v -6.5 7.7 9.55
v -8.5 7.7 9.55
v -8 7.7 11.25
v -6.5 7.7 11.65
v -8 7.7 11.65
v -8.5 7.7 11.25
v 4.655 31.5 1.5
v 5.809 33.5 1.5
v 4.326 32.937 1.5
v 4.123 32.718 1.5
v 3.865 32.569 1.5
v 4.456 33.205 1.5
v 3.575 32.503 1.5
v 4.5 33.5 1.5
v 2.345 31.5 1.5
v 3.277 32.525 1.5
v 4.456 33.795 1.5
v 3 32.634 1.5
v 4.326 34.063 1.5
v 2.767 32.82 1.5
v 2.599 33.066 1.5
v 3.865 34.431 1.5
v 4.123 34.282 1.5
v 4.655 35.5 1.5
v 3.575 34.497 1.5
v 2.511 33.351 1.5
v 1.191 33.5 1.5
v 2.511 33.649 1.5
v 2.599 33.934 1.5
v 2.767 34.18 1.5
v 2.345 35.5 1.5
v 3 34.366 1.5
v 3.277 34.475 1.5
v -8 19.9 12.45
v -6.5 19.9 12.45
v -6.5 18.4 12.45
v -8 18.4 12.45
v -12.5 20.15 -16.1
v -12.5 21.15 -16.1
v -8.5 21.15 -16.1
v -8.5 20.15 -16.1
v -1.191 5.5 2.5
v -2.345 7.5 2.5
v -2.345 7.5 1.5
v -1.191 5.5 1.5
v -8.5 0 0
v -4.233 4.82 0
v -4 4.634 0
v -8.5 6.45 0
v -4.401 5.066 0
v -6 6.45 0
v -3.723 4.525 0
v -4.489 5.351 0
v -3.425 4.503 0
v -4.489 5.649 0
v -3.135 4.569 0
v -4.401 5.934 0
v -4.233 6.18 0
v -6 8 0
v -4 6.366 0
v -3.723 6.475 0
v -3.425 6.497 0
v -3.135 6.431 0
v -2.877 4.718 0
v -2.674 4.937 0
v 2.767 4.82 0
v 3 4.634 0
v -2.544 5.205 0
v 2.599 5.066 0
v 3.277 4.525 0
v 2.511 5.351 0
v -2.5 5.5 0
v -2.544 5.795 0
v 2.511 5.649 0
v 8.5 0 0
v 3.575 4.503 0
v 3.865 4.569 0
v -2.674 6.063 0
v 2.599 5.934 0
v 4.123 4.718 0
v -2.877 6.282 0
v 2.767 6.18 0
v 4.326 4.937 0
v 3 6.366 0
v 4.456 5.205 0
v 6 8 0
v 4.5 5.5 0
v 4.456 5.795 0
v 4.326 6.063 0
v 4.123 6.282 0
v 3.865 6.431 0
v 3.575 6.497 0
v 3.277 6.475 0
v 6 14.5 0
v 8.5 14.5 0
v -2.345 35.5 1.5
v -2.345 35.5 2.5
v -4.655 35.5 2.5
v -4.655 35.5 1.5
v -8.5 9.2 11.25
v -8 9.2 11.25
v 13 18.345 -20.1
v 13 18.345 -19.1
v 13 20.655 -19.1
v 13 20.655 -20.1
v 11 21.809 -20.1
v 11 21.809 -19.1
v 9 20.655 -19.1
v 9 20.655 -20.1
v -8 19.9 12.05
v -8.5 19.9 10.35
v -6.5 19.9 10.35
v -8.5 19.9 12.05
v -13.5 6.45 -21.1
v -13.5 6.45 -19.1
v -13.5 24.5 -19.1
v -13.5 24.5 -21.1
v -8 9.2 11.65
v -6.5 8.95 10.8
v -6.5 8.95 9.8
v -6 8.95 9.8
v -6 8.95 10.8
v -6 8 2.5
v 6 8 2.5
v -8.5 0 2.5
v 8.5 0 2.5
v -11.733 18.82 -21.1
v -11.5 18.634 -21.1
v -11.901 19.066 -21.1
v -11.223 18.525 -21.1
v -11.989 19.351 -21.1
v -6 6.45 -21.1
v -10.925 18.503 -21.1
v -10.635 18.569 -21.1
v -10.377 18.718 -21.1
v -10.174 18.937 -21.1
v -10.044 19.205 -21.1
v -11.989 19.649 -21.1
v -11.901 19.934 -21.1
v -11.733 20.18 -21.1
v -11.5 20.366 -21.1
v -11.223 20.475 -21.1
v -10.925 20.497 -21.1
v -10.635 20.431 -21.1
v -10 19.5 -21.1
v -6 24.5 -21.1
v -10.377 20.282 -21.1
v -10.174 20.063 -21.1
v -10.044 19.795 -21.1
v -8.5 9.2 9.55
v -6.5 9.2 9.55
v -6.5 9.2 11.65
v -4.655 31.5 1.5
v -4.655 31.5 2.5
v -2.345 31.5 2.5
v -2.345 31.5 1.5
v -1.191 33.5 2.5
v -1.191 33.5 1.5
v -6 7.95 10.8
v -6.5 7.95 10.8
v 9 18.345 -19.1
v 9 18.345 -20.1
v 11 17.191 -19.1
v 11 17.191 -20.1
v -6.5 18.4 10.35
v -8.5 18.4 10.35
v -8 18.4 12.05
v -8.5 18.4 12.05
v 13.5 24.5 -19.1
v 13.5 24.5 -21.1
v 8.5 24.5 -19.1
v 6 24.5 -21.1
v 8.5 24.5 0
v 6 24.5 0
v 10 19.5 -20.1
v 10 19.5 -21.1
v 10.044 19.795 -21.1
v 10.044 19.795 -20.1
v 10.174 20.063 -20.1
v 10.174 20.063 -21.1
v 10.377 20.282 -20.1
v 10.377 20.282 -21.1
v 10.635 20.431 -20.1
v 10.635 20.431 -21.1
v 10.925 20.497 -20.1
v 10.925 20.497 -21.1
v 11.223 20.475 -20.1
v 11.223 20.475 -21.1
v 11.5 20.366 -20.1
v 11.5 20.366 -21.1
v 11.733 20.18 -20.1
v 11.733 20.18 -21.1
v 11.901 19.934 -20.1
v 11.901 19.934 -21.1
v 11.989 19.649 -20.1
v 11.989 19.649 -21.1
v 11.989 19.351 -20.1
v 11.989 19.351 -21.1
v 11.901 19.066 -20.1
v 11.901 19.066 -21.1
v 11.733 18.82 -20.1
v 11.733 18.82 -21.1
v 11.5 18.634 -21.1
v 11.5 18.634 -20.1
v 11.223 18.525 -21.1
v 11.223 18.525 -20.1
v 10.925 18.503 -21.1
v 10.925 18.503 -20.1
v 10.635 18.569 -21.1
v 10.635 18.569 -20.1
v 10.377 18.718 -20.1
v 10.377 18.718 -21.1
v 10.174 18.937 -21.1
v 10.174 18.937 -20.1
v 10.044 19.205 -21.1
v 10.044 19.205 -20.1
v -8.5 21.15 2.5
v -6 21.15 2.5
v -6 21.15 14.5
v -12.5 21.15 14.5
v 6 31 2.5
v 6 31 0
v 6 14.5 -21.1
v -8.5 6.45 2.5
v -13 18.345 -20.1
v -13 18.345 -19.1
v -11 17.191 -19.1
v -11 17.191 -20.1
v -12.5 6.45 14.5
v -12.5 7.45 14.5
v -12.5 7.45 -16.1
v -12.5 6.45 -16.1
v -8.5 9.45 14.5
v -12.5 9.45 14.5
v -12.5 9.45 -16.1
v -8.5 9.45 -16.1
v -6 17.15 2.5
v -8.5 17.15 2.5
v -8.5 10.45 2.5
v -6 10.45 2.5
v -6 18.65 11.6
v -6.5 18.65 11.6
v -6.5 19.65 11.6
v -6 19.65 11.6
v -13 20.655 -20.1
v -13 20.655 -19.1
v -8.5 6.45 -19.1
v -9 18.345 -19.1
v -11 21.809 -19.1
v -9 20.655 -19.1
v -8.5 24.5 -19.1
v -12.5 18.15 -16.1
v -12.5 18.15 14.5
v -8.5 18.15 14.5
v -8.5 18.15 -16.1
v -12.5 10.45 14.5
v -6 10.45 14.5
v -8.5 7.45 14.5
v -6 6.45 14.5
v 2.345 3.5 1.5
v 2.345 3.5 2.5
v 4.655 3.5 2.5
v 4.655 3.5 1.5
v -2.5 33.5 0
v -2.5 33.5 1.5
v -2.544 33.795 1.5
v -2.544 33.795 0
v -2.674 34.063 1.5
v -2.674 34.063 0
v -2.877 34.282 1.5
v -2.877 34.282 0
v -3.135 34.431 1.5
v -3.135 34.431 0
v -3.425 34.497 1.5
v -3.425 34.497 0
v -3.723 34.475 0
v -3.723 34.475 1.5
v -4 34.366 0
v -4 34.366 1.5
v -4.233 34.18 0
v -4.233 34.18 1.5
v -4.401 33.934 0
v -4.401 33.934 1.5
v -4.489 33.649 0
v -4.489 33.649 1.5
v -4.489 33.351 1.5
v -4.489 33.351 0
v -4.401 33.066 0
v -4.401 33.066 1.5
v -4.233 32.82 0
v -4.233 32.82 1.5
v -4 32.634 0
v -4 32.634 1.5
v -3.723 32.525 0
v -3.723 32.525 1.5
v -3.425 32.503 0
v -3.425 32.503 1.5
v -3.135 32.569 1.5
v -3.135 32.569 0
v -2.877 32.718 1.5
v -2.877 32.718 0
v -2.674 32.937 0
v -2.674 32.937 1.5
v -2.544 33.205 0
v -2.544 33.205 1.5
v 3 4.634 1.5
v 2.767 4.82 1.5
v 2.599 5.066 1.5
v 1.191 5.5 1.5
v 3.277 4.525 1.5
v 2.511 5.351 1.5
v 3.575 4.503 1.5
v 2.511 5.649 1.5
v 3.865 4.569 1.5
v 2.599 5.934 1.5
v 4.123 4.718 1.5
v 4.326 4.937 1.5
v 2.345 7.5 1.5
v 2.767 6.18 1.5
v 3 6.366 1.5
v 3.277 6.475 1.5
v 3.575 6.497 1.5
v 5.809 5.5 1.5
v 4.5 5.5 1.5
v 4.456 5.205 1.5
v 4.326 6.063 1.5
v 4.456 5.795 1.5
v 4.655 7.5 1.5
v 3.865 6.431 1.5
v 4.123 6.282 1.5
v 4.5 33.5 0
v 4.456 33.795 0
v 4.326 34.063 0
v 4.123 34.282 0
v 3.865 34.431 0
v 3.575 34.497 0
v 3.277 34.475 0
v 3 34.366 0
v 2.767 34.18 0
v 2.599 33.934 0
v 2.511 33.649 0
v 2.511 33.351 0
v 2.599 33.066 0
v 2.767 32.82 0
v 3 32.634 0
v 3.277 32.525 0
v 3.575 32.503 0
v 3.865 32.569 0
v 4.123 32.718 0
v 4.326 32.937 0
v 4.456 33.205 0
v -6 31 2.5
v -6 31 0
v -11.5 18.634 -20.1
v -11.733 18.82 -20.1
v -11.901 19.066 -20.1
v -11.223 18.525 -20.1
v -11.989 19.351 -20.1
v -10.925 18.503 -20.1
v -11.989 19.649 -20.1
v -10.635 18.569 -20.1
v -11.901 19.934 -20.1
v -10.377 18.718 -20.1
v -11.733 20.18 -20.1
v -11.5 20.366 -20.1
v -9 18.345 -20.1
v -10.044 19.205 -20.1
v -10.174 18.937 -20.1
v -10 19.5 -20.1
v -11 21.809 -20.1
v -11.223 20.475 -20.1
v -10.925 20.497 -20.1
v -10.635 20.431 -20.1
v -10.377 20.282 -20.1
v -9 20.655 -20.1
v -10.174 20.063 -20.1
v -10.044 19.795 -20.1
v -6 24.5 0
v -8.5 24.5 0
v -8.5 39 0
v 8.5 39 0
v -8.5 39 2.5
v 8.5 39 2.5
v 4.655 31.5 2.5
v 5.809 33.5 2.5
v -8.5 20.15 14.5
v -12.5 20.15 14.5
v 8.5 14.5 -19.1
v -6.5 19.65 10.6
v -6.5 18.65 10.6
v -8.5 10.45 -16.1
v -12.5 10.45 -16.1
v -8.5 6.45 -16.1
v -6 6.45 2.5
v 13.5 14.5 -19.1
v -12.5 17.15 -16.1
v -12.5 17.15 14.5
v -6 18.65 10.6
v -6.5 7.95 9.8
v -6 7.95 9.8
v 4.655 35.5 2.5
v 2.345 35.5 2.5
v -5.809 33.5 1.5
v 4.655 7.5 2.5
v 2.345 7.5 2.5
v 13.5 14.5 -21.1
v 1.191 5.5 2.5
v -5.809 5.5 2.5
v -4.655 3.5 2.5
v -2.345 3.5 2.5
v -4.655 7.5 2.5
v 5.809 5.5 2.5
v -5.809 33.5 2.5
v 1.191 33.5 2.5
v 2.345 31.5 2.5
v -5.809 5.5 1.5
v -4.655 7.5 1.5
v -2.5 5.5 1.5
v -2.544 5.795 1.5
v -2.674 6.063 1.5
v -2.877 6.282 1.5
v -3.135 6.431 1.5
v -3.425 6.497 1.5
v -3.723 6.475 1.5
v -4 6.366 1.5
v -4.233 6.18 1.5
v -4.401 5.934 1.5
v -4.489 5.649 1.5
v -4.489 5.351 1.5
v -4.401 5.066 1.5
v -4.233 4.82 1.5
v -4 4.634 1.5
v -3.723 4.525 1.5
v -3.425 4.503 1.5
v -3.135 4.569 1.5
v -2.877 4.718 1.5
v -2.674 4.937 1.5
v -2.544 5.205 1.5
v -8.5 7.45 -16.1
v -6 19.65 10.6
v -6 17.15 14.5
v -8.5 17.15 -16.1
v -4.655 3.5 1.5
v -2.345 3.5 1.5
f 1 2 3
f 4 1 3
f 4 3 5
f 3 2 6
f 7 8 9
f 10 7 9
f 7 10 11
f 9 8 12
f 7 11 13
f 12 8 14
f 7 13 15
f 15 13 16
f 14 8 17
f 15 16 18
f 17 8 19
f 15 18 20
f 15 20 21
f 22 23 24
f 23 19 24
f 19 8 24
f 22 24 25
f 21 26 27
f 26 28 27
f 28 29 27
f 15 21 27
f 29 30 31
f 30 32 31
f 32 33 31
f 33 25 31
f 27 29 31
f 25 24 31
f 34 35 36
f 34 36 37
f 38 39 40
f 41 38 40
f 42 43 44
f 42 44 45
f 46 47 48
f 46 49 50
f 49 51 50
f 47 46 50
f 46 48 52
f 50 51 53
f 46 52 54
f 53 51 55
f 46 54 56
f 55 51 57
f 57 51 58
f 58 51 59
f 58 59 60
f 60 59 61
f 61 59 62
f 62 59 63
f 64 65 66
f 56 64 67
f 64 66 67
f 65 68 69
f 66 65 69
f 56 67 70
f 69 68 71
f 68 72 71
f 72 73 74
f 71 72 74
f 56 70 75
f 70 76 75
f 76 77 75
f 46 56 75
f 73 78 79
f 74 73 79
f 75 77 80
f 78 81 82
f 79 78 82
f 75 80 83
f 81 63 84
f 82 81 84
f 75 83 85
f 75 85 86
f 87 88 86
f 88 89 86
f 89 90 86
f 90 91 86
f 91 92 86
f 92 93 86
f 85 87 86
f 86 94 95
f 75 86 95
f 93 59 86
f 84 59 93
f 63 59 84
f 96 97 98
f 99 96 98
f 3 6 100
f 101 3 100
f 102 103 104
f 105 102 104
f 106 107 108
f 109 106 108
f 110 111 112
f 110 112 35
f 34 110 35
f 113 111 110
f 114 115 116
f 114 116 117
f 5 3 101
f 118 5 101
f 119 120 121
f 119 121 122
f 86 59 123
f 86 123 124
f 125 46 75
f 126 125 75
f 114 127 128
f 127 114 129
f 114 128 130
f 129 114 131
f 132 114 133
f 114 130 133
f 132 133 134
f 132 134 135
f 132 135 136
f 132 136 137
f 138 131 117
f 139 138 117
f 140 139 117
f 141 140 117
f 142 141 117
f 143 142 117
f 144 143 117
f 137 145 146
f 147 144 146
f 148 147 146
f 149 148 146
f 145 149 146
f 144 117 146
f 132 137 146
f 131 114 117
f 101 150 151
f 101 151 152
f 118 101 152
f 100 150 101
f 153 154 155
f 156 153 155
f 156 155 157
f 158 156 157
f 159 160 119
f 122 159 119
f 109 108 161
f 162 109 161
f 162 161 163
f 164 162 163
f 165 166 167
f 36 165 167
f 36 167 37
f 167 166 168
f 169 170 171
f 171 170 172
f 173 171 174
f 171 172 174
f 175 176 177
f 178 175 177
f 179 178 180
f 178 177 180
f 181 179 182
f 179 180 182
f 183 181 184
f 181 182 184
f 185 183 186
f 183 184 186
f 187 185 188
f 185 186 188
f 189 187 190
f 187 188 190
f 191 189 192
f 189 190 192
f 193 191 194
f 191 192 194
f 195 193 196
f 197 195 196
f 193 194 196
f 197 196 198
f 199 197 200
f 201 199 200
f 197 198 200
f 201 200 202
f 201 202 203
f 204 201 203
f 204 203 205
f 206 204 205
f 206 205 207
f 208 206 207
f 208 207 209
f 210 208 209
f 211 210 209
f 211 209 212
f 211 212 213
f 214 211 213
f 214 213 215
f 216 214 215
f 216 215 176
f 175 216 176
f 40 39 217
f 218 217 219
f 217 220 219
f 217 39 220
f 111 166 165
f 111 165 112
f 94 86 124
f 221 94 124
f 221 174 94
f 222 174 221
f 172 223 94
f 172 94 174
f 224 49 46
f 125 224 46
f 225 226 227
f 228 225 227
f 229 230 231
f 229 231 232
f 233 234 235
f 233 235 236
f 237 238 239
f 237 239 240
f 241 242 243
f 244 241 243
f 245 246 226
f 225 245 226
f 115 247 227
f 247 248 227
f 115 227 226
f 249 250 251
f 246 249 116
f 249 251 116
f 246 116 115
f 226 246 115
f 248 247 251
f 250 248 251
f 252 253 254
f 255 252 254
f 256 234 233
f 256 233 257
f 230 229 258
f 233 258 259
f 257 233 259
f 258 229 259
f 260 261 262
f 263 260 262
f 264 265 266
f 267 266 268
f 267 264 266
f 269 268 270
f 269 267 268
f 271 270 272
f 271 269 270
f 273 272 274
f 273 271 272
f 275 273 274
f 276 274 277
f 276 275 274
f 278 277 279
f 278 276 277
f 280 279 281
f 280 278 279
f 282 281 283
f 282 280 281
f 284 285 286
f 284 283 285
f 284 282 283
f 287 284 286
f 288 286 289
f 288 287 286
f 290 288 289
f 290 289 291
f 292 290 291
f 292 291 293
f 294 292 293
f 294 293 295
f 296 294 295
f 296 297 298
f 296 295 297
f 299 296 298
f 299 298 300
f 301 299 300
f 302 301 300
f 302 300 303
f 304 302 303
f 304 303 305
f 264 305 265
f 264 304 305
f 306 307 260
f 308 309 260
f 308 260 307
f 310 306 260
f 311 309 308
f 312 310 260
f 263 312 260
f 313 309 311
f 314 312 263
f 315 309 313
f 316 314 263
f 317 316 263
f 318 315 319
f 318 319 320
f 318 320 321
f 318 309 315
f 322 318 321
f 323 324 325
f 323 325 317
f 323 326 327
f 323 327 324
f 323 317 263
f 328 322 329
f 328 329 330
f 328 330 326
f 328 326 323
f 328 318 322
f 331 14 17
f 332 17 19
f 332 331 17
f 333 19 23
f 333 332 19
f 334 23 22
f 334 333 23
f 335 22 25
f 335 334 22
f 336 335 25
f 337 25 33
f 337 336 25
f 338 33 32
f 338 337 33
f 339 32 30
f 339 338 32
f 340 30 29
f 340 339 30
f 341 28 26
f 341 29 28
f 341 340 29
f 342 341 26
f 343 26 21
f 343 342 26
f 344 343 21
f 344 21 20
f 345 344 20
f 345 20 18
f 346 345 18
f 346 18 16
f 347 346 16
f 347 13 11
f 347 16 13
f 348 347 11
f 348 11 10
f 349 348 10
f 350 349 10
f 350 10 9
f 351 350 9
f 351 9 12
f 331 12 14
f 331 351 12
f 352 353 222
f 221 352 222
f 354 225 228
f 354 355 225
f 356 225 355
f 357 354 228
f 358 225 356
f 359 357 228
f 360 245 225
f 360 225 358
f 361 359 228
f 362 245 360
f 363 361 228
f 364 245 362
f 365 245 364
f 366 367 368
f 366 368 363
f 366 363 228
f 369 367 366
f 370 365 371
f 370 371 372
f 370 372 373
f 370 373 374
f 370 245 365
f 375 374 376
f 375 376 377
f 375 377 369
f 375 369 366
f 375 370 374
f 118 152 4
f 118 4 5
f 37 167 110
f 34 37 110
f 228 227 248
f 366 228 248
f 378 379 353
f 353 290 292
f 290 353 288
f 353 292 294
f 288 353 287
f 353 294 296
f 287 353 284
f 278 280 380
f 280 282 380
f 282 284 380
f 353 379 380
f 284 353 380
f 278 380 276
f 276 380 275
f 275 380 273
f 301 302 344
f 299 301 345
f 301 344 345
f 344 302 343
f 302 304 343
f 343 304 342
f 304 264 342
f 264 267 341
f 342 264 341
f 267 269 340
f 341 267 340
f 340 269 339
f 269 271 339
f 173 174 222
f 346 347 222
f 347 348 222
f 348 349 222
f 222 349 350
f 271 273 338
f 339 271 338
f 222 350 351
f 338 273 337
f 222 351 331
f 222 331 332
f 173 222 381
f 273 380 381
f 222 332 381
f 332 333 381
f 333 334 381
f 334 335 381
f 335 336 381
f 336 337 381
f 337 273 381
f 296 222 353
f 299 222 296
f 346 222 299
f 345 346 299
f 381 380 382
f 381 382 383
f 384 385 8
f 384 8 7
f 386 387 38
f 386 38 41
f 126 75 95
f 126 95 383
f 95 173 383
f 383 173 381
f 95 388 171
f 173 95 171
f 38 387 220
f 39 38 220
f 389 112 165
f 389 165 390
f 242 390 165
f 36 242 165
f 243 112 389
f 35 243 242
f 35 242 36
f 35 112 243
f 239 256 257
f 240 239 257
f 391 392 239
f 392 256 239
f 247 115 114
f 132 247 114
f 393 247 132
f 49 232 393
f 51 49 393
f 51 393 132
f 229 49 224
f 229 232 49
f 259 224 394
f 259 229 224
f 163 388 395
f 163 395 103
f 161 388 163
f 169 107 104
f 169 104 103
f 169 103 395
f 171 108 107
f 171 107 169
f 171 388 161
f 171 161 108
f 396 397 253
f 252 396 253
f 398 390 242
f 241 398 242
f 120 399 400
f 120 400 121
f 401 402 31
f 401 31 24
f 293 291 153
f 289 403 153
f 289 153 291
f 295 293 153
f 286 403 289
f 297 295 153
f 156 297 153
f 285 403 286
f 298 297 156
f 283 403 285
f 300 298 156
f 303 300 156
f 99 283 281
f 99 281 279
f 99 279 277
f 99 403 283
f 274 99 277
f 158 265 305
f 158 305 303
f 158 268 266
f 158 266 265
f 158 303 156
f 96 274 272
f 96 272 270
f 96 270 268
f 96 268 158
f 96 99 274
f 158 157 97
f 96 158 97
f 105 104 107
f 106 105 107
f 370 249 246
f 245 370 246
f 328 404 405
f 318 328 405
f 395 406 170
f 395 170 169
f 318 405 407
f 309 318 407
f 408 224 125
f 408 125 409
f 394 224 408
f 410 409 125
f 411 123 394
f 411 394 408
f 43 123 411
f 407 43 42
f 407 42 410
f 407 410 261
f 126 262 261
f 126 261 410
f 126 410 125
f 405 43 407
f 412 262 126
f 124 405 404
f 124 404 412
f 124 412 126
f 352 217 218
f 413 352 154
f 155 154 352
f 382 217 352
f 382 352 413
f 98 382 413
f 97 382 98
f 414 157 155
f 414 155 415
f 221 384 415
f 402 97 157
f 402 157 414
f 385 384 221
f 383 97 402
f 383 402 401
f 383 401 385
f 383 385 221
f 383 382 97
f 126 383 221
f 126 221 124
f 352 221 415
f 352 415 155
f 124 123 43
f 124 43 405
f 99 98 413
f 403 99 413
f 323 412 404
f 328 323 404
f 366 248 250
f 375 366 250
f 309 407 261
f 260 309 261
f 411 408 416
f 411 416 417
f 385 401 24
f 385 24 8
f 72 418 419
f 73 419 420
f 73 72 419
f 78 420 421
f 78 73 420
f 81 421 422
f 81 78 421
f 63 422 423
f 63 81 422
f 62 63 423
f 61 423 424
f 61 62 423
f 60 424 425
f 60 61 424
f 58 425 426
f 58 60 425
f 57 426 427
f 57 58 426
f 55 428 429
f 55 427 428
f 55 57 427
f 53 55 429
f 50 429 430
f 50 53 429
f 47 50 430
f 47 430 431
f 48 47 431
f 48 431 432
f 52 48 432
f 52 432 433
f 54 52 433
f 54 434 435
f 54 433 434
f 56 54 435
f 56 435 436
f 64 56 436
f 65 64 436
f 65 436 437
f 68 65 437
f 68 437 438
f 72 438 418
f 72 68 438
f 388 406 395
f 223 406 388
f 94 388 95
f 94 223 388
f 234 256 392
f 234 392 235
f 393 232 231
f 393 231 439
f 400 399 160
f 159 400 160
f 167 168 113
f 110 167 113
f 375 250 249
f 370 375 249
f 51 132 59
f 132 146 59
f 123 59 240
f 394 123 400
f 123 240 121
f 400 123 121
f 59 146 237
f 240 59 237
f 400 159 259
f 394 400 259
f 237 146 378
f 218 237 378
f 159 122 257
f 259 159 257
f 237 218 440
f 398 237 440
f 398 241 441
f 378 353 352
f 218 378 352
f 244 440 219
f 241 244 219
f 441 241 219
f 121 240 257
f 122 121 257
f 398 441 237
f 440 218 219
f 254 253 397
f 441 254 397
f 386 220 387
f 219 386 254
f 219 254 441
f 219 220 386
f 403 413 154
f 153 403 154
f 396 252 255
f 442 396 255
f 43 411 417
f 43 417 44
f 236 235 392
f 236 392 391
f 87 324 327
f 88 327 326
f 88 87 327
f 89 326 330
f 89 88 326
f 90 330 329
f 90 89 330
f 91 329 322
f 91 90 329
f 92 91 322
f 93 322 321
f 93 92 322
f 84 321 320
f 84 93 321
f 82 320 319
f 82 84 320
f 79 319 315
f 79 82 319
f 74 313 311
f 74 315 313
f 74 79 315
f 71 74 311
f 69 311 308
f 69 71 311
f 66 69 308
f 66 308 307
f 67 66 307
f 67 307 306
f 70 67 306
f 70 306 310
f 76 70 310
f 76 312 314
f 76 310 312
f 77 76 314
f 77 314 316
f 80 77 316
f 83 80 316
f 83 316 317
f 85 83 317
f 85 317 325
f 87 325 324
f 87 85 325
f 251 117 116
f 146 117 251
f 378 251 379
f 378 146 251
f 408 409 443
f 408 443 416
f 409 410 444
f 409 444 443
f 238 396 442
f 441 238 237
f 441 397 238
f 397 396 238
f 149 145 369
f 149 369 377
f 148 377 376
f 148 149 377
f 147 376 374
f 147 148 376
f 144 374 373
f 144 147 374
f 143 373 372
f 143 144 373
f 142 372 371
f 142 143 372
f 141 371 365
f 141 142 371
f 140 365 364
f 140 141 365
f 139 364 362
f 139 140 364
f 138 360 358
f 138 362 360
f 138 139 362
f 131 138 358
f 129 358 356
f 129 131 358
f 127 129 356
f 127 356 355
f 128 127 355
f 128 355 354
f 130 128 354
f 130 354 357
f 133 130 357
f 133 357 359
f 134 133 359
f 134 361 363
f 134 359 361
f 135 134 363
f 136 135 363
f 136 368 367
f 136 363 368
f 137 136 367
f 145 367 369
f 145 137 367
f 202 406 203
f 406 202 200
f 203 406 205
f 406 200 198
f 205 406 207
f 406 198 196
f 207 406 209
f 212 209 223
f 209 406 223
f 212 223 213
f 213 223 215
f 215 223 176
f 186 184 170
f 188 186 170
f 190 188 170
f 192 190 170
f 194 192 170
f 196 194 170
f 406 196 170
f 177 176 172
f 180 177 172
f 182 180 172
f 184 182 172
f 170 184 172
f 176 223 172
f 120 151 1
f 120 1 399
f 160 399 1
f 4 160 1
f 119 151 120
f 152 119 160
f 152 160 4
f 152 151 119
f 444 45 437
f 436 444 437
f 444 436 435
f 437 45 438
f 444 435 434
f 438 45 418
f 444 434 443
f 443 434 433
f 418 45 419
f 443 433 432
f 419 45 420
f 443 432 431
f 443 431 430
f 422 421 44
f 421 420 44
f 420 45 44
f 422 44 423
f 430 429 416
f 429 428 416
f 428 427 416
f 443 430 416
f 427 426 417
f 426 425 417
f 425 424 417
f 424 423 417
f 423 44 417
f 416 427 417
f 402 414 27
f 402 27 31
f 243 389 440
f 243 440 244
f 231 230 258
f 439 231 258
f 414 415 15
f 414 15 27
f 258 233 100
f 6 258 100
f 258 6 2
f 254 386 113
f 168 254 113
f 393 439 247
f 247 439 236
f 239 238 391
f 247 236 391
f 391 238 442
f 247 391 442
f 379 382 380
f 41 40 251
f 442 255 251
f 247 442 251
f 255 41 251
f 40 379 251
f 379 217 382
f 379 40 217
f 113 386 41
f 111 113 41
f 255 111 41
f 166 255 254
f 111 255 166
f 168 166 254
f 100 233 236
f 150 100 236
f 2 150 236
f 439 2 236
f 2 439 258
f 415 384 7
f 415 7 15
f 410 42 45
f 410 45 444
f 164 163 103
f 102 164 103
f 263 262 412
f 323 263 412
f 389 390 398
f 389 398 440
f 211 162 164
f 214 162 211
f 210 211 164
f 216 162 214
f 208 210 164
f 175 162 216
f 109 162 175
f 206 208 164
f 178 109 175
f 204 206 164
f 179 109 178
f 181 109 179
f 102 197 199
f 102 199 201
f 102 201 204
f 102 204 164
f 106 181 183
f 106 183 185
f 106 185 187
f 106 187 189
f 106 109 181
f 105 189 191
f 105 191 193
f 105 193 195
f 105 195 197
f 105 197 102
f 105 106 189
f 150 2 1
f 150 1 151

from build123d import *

# Parameters (mm, degrees)
SKETCH1_W                     = 17
SKETCH1_H                     = 39
SKETCH1_R                     = 1
SKETCH1_W_2                   = 12
SKETCH1_H_2                   = 23
SERVOBRACKET_DEPTH            = 2.5
SKETCH1_5_W                   = 2.5
SKETCH1_5_H                   = 10
SUPPORTLEGS_DEPTH             = 21.1
SKETCH2_W                     = 2
SKETCH2_H                     = 10
SUPPORTFOOT_DEPTH             = 5
BASEBOLTHOLE_START            = -3
SKETCH3_R                     = 1
BASEBOLTHOLE_DEPTH            = 25.6
SERVONUTSLOTS_DEPTH           = 1
BASENUTSLOTS_DEPTH            = 1
SKETCH6_W                     = 2.5
SKETCH6_H                     = 4
TUBEHOLDERBASE_DEPTH          = 12
SKETCH7_W                     = 4
SKETCH7_H                     = 1
TUBEHOLDERSTIFFENERRIBS_DEPTH = 30.6
SKETCH8_W                     = 1
SKETCH8_H                     = 1
SKETCH8_W_2                   = 1.5
SKETCH8_H_2                   = 1.5
TUBECLIPENTRANCES_DEPTH       = 2
SKETCH8_3_W                   = 1
SKETCH8_3_H                   = 1
CABLEEXITS_DEPTH              = 2.5
SKETCH9_W                     = 1.5
SKETCH9_H                     = 1.5
TUBECLIPLOCKSLOT_DEPTH        = 0.6
SKETCH10_W                    = 1.5
SKETCH10_H                    = 1.5
TUBECLIPLOCKSLOT2_DEPTH       = 0.6
SUPPORTLEGEXTENSION_DEPTH     = 8.05
SKETCH8_4_W                   = 0.2
SKETCH8_4_H                   = 1.5
TUBECLIPLOCKCLEARANCE_DEPTH   = 0.5


with BuildPart() as part:
    # Sketch1 → ServoBracket (new body)
    with BuildSketch(Plane.XY):
        with Locations((0, 19.5)):
            Rectangle(SKETCH1_W, SKETCH1_H)
        with Locations((-3.5, 33.5)):
            Circle(SKETCH1_R, mode=Mode.SUBTRACT)
        with Locations((-3.5, 5.5)):
            Circle(SKETCH1_R, mode=Mode.SUBTRACT)
        with Locations((3.5, 5.5)):
            Circle(SKETCH1_R, mode=Mode.SUBTRACT)
        with Locations((3.5, 33.5)):
            Circle(SKETCH1_R, mode=Mode.SUBTRACT)
        with Locations((0, 19.5)):
            Rectangle(SKETCH1_W_2, SKETCH1_H_2, mode=Mode.SUBTRACT)
    extrude(amount=SERVOBRACKET_DEPTH)

    # Sketch1<5> → SupportLegs (add)
    with BuildSketch(Plane.XY):
        with Locations((-7.25, 19.5)):
            Rectangle(SKETCH1_5_W, SKETCH1_5_H)
        with Locations((7.25, 19.5)):
            Rectangle(SKETCH1_5_W, SKETCH1_5_H)
    extrude(amount=-SUPPORTLEGS_DEPTH)

    # Sketch2 → SupportFoot (add)
    with BuildSketch(Plane.ZY.offset(8.5)):
        with Locations((-20.1, 19.5)):
            Rectangle(SKETCH2_W, SKETCH2_H)
    supportfoot = extrude(amount=SUPPORTFOOT_DEPTH)

    # Sketch3 → BaseBoltHole (cut)
    with BuildSketch(Plane.XY.offset(-19.1).offset(BASEBOLTHOLE_START)):
        with Locations((-11, 19.5)):
            Circle(SKETCH3_R)
    basebolthole = extrude(amount=BASEBOLTHOLE_DEPTH, mode=Mode.SUBTRACT)

    # SupportFoot2: SupportFoot, BaseBoltHole across plane
    add(supportfoot.mirror(Plane(origin=(0, 0, 0), x_dir=(0, 0, 1), z_dir=(1, 0, 0))))
    add(basebolthole.mirror(Plane(origin=(0, 0, 0), x_dir=(0, 0, 1), z_dir=(1, 0, 0))), mode=Mode.SUBTRACT)

    # Sketch4 → ServoNutSlots (cut)
    with BuildSketch(Plane.XY.offset(2.5)):
        Polygon((-4.654700538, 7.5), (-2.345299462, 7.5), (-1.190598923, 5.5), (-2.345299462, 3.5), (-4.654700538, 3.5), (-5.809401077, 5.5), align=None)
        Polygon((-1.190598923, 33.5), (-2.345299462, 35.5), (-4.654700538, 35.5), (-5.809401077, 33.5), (-4.654700538, 31.5), (-2.345299462, 31.5), align=None)
        Polygon((2.345299462, 31.5), (1.190598923, 33.5), (2.345299462, 35.5), (4.654700538, 35.5), (5.809401077, 33.5), (4.654700538, 31.5), align=None)
        Polygon((4.654700538, 7.5), (2.345299462, 7.5), (1.190598923, 5.5), (2.345299462, 3.5), (4.654700538, 3.5), (5.809401077, 5.5), align=None)
    extrude(amount=-SERVONUTSLOTS_DEPTH, mode=Mode.SUBTRACT)

    # Sketch5 → BaseNutSlots (cut)
    with BuildSketch(Plane.XY.offset(-19.1)):
        Polygon((-11, 21.809401077), (-13, 20.654700538), (-13, 18.345299462), (-11, 17.190598923), (-9, 18.345299462), (-9, 20.654700538), align=None)
        Polygon((11, 21.809401077), (9, 20.654700538), (9, 18.345299462), (11, 17.190598923), (13, 18.345299462), (13, 20.654700538), align=None)
    extrude(amount=-BASENUTSLOTS_DEPTH, mode=Mode.SUBTRACT)

    # Sketch6 → TubeHolderBase (add)
    with BuildSketch(Plane.XY.offset(2.5)):
        with Locations((-7.25, 19.15)):
            Rectangle(SKETCH6_W, SKETCH6_H)
    tubeholderbase = extrude(amount=TUBEHOLDERBASE_DEPTH)

    # Sketch7 → TubeHolderStiffenerRibs (add)
    with BuildSketch(Plane.XY.offset(14.5)):
        with Locations((-10.5, 20.65)):
            Rectangle(SKETCH7_W, SKETCH7_H)
        with Locations((-10.5, 17.65)):
            Rectangle(SKETCH7_W, SKETCH7_H)
    tubeholderstiffenerribs = extrude(amount=-TUBEHOLDERSTIFFENERRIBS_DEPTH)

    # TubeHolder2: TubeHolderBase, TubeHolderStiffenerRibs across plane
    add(tubeholderbase.mirror(Plane.ZX.offset(13.8)))
    add(tubeholderstiffenerribs.mirror(Plane.ZX.offset(13.8)))

    # Sketch8 → TubeClipEntrances (cut)
    with BuildSketch(Plane.ZY.offset(8.5)):
        with Locations((11.1, 19.15)):
            Rectangle(SKETCH8_W, SKETCH8_H)
        with Locations((11.1, 19.15)):
            Rectangle(SKETCH8_W_2, SKETCH8_H_2)
        with Locations((11.1, 19.15)):
            Rectangle(SKETCH8_W, SKETCH8_H, mode=Mode.SUBTRACT)
        with Locations((10.3, 8.45)):
            Rectangle(SKETCH8_W, SKETCH8_H)
        with Locations((10.3, 8.45)):
            Rectangle(SKETCH8_W_2, SKETCH8_H_2)
        with Locations((10.3, 8.45)):
            Rectangle(SKETCH8_W, SKETCH8_H, mode=Mode.SUBTRACT)
    extrude(amount=-TUBECLIPENTRANCES_DEPTH, mode=Mode.SUBTRACT)

    # Sketch8<3> → CableExits (cut)
    with BuildSketch(Plane.ZY.offset(8.5)):
        with Locations((11.1, 19.15)):
            Rectangle(SKETCH8_3_W, SKETCH8_3_H)
        with Locations((10.3, 8.45)):
            Rectangle(SKETCH8_3_W, SKETCH8_3_H)
    extrude(amount=-CABLEEXITS_DEPTH, mode=Mode.SUBTRACT)

    # Sketch9 → TubeClipLockSlot (cut)
    with BuildSketch(Plane(origin=(0, 0, 11.85), x_dir=(-1, 0, 0), z_dir=(0, 0, -1))):
        with Locations((7.25, 19.15)):
            Rectangle(SKETCH9_W, SKETCH9_H)
    extrude(amount=-TUBECLIPLOCKSLOT_DEPTH, mode=Mode.SUBTRACT)

    # Sketch10 → TubeClipLockSlot2 (cut)
    with BuildSketch(Plane(origin=(0, 0, 11.05), x_dir=(-1, 0, 0), z_dir=(0, 0, -1))):
        with Locations((7.25, 8.45)):
            Rectangle(SKETCH10_W, SKETCH10_H)
    extrude(amount=-TUBECLIPLOCKSLOT2_DEPTH, mode=Mode.SUBTRACT)

    # Sketch11 → SupportLegExtension (add)
    with BuildSketch(Plane.XZ.offset(-14.5)):
        Polygon((-6, 0), (-8.5, 0), (-8.5, -19.1), (-13.5, -19.1), (-13.5, -21.1), (-6, -21.1), align=None)
    extrude(amount=SUPPORTLEGEXTENSION_DEPTH)

    # Sketch8<4> → TubeClipLockClearance (cut)
    with BuildSketch(Plane.ZY.offset(8.5)):
        with Locations((11.15, 8.45)):
            Rectangle(SKETCH8_4_W, SKETCH8_4_H)
        with Locations((11.95, 19.15)):
            Rectangle(SKETCH8_4_W, SKETCH8_4_H)
    extrude(amount=-TUBECLIPLOCKCLEARANCE_DEPTH, mode=Mode.SUBTRACT)


solid = part.part
